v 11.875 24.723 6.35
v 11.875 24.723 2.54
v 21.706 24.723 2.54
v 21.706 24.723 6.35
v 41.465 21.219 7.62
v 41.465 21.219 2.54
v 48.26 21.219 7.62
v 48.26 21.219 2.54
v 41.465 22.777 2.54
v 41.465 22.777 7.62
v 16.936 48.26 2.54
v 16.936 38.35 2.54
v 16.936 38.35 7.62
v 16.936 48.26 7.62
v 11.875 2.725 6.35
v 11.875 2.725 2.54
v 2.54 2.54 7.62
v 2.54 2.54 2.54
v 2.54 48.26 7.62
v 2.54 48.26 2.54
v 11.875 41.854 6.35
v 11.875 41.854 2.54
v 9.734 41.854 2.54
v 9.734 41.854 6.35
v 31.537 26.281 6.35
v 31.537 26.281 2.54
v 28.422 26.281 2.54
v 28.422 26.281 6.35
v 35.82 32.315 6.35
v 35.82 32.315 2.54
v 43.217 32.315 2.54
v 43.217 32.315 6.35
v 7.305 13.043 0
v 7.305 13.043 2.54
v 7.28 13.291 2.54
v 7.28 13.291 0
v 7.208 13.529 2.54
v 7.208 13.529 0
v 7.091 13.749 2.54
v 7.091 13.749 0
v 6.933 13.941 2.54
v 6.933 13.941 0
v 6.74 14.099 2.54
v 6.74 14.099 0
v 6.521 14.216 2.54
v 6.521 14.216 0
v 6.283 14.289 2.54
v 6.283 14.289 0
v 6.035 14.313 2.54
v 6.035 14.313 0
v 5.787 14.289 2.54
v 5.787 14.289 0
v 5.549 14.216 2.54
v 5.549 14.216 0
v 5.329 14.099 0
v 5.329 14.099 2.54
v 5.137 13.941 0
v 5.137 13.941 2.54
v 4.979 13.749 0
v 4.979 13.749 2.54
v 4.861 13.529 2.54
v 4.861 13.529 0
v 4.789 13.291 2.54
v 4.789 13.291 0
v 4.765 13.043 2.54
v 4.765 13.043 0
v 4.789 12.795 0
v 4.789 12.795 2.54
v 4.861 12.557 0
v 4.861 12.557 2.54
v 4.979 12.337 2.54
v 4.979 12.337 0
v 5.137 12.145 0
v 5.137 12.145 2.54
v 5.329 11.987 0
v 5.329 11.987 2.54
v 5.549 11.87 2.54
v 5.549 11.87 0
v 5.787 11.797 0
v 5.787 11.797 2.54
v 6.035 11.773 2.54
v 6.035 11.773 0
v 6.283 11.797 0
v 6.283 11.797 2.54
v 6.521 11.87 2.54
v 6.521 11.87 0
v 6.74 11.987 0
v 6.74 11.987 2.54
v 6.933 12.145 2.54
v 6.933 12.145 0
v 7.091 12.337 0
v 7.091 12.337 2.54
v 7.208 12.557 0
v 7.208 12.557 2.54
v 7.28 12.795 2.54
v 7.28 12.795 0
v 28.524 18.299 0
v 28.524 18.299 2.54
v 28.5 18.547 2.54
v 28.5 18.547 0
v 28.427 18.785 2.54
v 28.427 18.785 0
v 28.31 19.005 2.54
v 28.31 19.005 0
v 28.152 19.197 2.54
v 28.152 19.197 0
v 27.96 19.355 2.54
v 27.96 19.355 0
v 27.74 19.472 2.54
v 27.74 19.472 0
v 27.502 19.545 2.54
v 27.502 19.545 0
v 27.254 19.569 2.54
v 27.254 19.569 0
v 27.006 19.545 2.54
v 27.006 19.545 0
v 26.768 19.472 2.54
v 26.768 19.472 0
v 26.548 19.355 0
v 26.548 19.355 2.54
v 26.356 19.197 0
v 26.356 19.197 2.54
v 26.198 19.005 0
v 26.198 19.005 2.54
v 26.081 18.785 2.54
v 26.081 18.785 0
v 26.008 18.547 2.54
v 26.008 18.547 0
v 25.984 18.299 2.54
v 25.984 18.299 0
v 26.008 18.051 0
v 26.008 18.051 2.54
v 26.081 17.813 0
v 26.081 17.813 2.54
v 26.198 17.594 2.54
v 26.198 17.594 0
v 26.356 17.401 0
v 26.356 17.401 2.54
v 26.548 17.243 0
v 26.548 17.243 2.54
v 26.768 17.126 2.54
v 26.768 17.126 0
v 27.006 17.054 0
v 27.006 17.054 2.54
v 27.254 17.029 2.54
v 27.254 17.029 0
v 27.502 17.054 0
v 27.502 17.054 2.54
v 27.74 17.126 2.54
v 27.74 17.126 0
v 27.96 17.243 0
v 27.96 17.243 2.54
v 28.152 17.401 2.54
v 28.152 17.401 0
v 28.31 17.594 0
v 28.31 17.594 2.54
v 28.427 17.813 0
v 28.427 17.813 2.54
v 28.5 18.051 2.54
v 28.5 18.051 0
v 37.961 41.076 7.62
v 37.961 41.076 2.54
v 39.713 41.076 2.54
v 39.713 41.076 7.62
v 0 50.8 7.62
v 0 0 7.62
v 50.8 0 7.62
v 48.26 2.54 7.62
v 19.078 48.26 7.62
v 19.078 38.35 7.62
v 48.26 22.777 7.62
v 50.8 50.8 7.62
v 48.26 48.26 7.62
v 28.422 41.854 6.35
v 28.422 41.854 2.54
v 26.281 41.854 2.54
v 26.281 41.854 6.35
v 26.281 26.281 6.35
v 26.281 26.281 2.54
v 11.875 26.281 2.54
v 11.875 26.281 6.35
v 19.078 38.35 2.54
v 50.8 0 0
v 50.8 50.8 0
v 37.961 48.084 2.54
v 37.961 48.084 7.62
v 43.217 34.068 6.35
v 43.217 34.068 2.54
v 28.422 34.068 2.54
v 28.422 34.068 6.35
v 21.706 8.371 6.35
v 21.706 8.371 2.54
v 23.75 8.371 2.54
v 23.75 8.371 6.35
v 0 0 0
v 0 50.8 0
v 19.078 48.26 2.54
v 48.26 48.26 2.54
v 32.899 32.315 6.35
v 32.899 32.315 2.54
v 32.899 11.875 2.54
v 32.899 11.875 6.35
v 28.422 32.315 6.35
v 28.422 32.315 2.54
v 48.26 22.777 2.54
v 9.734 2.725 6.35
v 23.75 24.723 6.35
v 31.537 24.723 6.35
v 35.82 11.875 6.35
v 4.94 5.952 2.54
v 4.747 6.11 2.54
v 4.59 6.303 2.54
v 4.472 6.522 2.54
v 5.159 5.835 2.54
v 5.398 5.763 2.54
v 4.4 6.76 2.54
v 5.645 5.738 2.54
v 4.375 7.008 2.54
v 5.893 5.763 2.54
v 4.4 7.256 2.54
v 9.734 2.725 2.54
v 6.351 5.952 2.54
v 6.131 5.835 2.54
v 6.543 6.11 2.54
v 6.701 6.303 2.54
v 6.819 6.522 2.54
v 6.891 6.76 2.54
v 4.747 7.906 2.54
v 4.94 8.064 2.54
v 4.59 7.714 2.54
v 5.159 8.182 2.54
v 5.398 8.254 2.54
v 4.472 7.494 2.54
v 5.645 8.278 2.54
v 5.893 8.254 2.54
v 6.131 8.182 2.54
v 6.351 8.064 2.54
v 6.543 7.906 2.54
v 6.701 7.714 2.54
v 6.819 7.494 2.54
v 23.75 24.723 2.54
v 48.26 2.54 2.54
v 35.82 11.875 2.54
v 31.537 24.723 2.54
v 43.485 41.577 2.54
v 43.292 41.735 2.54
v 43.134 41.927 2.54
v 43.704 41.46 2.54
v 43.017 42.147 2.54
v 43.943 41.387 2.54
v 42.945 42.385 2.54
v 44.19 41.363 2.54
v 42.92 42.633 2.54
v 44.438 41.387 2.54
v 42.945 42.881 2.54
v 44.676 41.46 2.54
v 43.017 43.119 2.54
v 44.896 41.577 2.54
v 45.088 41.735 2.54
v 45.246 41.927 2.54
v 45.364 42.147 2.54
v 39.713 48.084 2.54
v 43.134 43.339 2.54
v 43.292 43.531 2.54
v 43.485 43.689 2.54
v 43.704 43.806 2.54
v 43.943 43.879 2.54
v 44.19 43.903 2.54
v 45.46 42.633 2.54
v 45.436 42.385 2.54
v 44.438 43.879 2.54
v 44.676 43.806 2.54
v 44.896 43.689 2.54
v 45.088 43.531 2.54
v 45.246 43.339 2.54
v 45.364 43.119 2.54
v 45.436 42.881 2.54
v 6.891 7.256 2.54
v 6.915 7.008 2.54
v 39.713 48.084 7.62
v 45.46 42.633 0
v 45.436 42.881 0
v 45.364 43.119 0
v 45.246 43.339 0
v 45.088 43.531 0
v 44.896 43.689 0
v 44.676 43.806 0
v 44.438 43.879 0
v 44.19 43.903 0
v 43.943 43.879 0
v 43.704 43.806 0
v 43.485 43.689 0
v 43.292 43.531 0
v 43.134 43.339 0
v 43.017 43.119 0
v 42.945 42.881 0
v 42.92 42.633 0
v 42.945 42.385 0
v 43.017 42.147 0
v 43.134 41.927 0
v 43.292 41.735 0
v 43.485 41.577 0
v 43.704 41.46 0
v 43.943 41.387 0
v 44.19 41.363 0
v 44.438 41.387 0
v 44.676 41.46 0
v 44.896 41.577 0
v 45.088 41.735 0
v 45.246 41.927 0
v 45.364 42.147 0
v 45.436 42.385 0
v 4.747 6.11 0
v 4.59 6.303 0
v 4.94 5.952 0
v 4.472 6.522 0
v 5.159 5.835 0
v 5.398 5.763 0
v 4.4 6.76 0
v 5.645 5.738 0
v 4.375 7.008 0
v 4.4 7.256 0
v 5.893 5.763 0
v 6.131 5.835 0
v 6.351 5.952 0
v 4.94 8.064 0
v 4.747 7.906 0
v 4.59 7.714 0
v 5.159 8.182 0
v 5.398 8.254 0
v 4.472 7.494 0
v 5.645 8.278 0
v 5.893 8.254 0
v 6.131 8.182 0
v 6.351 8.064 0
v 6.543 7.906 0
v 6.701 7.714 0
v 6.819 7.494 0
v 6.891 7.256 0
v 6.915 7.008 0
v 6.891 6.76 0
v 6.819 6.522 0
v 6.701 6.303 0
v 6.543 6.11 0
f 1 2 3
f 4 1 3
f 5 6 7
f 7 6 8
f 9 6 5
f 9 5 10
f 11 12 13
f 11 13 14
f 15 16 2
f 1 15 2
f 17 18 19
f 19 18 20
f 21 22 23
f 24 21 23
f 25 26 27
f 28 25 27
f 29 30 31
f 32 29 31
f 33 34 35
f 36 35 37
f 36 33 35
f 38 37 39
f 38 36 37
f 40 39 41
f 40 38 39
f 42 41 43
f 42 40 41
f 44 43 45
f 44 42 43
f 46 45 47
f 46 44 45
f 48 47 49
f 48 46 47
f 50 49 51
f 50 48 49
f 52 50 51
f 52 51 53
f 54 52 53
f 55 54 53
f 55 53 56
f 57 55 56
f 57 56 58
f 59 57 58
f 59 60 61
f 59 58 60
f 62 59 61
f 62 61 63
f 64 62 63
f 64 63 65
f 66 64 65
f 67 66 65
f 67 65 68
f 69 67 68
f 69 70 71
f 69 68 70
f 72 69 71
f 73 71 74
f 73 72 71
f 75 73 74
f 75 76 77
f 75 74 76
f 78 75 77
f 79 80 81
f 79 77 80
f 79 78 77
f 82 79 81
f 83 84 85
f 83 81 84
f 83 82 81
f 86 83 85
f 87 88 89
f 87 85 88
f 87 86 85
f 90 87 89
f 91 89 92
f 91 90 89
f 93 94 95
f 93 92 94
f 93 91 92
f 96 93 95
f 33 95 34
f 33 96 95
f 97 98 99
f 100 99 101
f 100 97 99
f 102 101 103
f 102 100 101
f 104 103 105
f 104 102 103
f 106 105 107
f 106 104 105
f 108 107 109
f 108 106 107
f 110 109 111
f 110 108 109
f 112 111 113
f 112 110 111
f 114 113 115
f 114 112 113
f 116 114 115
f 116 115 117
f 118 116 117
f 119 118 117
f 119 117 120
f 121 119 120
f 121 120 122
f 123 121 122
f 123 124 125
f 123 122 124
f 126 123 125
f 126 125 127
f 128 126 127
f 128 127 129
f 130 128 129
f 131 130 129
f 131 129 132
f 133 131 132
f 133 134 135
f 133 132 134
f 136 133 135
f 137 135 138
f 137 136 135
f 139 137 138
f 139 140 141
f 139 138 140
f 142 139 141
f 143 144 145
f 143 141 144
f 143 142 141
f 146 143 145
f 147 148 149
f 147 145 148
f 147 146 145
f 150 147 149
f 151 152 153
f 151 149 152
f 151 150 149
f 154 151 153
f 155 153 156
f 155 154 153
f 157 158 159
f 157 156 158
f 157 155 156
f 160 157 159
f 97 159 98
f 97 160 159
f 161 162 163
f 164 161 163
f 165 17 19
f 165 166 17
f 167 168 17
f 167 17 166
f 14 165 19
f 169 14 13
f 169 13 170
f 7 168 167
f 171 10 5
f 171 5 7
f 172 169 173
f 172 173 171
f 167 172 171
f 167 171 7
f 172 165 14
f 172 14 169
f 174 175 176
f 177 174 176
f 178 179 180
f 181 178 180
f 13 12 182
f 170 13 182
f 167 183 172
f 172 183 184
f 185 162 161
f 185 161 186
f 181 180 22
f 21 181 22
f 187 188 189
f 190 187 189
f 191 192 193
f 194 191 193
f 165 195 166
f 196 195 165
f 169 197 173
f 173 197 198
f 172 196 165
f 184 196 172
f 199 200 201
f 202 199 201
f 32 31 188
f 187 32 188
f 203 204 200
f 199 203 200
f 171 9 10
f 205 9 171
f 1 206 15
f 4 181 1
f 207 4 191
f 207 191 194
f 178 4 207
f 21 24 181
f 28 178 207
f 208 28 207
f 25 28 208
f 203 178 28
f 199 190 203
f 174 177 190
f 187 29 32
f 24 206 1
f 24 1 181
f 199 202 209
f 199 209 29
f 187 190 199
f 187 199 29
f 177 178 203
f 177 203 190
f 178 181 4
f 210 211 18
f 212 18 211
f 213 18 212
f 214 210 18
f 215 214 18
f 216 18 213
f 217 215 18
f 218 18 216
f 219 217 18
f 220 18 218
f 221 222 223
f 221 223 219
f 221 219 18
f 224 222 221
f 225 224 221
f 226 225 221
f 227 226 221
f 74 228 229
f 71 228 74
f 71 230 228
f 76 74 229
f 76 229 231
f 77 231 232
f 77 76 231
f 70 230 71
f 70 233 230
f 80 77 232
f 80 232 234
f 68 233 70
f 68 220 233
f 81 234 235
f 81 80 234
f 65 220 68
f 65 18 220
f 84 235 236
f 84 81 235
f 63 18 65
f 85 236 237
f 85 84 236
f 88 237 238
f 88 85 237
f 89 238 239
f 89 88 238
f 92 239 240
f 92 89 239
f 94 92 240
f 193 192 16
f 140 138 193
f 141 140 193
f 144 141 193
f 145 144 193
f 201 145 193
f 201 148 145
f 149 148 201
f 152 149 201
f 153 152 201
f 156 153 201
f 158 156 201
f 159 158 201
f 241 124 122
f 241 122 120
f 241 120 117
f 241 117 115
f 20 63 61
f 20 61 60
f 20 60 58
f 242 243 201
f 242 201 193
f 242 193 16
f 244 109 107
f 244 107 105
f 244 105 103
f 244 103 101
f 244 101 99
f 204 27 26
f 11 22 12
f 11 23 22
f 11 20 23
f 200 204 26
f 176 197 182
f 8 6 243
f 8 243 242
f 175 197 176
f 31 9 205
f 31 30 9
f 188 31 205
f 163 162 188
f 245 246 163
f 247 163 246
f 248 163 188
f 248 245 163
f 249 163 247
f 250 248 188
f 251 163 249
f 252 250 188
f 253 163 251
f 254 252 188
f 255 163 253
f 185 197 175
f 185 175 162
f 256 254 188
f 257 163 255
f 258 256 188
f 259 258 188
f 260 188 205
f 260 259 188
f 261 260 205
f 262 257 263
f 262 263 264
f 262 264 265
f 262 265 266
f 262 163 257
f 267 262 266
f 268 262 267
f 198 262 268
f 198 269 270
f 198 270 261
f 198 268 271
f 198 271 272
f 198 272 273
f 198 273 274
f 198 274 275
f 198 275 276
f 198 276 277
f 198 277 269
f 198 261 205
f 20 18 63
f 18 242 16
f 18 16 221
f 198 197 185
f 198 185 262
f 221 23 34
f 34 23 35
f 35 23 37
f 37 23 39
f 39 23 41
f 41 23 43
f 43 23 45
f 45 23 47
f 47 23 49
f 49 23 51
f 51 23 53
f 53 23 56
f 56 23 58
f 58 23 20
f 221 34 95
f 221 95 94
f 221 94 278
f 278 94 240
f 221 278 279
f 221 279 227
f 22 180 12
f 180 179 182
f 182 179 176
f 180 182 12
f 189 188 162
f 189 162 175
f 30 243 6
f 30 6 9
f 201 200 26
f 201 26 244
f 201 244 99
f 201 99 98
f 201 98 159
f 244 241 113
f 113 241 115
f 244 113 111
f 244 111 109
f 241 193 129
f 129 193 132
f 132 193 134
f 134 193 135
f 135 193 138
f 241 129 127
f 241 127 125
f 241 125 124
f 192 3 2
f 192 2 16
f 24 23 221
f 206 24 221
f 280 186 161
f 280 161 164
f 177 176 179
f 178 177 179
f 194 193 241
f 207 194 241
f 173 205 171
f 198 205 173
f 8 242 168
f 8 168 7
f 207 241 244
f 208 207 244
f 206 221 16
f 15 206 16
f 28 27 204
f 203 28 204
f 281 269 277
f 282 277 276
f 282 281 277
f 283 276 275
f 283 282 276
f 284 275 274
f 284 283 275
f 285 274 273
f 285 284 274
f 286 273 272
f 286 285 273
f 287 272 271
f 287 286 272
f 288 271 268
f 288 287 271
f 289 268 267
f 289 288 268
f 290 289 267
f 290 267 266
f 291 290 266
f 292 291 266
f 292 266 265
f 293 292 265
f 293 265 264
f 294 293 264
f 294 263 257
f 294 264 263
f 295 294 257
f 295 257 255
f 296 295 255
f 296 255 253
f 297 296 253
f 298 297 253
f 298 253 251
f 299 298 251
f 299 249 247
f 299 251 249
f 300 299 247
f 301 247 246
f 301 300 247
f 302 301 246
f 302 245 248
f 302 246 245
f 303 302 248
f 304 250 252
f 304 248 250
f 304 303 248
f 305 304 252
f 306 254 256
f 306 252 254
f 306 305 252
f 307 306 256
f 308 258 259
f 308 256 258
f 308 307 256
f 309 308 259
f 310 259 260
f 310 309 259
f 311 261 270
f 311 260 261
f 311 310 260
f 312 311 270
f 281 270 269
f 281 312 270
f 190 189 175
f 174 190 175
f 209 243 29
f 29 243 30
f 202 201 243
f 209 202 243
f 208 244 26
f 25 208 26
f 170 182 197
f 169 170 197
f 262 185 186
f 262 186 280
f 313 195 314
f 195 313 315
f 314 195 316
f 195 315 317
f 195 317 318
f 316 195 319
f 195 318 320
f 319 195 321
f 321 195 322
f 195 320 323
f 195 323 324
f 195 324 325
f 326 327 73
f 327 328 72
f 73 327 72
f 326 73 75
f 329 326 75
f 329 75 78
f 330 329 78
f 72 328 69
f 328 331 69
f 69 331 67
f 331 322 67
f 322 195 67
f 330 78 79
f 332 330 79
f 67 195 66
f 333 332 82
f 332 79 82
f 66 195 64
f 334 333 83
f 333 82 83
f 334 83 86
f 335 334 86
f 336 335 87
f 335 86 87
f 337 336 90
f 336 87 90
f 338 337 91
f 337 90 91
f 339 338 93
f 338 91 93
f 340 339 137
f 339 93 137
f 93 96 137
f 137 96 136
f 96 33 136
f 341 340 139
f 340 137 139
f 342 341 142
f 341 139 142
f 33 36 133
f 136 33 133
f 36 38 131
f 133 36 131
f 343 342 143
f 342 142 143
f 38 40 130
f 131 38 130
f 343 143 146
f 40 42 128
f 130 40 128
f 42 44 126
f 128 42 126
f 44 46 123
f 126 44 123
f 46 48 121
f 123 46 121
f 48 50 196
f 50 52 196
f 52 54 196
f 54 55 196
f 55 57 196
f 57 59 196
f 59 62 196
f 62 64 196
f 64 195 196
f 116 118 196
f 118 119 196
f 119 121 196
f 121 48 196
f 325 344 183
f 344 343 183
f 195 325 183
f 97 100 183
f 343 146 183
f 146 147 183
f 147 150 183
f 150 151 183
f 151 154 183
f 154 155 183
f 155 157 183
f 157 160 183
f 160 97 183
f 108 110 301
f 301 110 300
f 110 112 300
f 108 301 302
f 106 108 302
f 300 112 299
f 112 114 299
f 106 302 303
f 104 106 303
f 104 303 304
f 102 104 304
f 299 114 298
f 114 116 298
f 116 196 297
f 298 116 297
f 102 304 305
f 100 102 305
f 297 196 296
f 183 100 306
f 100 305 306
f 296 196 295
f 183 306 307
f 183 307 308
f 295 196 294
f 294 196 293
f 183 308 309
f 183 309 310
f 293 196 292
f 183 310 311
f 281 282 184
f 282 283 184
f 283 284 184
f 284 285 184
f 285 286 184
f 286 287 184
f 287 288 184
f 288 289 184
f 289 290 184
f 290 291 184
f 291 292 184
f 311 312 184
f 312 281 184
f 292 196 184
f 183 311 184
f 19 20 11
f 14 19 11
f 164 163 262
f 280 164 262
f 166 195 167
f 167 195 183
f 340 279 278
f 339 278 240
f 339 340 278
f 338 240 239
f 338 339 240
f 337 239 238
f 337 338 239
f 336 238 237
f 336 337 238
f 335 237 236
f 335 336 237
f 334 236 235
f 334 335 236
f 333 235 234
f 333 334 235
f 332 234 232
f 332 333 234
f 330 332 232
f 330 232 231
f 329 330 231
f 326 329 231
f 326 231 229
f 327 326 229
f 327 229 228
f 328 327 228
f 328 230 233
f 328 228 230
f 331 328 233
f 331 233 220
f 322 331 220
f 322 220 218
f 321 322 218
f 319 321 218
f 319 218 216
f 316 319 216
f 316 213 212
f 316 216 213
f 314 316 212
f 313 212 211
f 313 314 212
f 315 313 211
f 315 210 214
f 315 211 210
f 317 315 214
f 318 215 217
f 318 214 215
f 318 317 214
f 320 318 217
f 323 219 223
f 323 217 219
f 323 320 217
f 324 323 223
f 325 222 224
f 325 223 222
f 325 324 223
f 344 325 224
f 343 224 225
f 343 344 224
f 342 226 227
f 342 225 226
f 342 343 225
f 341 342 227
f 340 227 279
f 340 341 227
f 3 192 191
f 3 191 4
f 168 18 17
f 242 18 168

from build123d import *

# Parameters (mm, degrees)
F0_W      = 50.8
F0_H      = 50.8
F1_DEPTH  = 7.62
F2_T      = -2.54
F3_W      = 2.044051
F3_H      = 16.352408
F4_DEPTH  = 6.35
F5_W      = 2.141385
F5_H      = 10.122921
F5_W_2    = 6.813503
F5_H_2    = 1.557372
F6_DEPTH  = 7.62
F7_W      = 1.752042
F7_H      = 7.008177
F8_DEPTH  = 7.62
F9_R      = 1.27
F10_DEPTH = 25.4
F11_R     = 1.27
F12_DEPTH = 25.4


with BuildPart() as f1:
    # F0 (on Top) → F1 (new body)
    with BuildSketch(Plane.XY):
        with Locations((25.4, 25.4)):
            Rectangle(F0_W, F0_H)
    extrude(amount=F1_DEPTH)

    # F2
    f2_openings = [f1.faces().sort_by_distance(p)[0] for p in [
        (25.4, 25.4, 7.62),
    ]]
    offset(amount=F2_T, openings=f2_openings)

    # F3 (on Top) → F4 (join)
    with BuildSketch(Plane.XY):
        Polygon((9.733576, 41.854382), (9.733576, 2.725402), (11.874964, 2.725402), (11.874964, 24.723284), (11.874964, 26.280658), (11.874964, 41.854382), align=None)
        Polygon((11.874964, 26.280658), (11.874964, 24.723284), (21.705878, 24.723284), (23.749929, 24.723284), (31.536791, 24.723284), (31.536791, 26.280658), (28.422045, 26.280658), (26.280656, 26.280658), align=None)
        with Locations((22.727903, 16.54708)):
            Rectangle(F3_W, F3_H)
        Polygon((26.280656, 41.854382), (26.280656, 26.280658), (28.422045, 26.280658), (28.422045, 32.315474), (28.422045, 34.06752), (28.422045, 41.854382), align=None)
        Polygon((28.422045, 34.06752), (28.422045, 32.315474), (32.899488, 32.315474), (35.819563, 32.315474), (43.217082, 32.315474), (43.217082, 34.06752), align=None)
        Polygon((35.819563, 32.315474), (32.899488, 32.315474), (32.899488, 11.874964), (35.819563, 11.874964), (35.819563, 22.095219), (35.819563, 24.723284), align=None)
    extrude(amount=F4_DEPTH)

    # F5 (on Top) → F6 (join)
    with BuildSketch(Plane.XY):
        with Locations((18.007117, 43.411752)):
            Rectangle(F5_W, F5_H)
        with Locations((44.871788, 21.997884)):
            Rectangle(F5_W_2, F5_H_2)
    extrude(amount=F6_DEPTH)

    # F7 (on Top) → F8 (join)
    with BuildSketch(Plane.XY):
        with Locations((38.836971, 44.579783)):
            Rectangle(F7_W, F7_H)
    extrude(amount=F8_DEPTH)

    # F9 (on Top) → F10 (cut)
    with BuildSketch(Plane.XY):
        with Locations((5.645474, 7.008175)):
            Circle(F9_R)
        with Locations((6.034818, 13.042993)):
            Circle(F9_R)
        with Locations((44.19044, 42.633064)):
            Circle(F9_R)
    extrude(amount=F10_DEPTH, mode=Mode.SUBTRACT)

    # F11 (on Top) → F12 (cut)
    with BuildSketch(Plane.XY):
        with Locations((27.254015, 18.299123)):
            Circle(F11_R)
    extrude(amount=F12_DEPTH, mode=Mode.SUBTRACT)


solid = f1.part
